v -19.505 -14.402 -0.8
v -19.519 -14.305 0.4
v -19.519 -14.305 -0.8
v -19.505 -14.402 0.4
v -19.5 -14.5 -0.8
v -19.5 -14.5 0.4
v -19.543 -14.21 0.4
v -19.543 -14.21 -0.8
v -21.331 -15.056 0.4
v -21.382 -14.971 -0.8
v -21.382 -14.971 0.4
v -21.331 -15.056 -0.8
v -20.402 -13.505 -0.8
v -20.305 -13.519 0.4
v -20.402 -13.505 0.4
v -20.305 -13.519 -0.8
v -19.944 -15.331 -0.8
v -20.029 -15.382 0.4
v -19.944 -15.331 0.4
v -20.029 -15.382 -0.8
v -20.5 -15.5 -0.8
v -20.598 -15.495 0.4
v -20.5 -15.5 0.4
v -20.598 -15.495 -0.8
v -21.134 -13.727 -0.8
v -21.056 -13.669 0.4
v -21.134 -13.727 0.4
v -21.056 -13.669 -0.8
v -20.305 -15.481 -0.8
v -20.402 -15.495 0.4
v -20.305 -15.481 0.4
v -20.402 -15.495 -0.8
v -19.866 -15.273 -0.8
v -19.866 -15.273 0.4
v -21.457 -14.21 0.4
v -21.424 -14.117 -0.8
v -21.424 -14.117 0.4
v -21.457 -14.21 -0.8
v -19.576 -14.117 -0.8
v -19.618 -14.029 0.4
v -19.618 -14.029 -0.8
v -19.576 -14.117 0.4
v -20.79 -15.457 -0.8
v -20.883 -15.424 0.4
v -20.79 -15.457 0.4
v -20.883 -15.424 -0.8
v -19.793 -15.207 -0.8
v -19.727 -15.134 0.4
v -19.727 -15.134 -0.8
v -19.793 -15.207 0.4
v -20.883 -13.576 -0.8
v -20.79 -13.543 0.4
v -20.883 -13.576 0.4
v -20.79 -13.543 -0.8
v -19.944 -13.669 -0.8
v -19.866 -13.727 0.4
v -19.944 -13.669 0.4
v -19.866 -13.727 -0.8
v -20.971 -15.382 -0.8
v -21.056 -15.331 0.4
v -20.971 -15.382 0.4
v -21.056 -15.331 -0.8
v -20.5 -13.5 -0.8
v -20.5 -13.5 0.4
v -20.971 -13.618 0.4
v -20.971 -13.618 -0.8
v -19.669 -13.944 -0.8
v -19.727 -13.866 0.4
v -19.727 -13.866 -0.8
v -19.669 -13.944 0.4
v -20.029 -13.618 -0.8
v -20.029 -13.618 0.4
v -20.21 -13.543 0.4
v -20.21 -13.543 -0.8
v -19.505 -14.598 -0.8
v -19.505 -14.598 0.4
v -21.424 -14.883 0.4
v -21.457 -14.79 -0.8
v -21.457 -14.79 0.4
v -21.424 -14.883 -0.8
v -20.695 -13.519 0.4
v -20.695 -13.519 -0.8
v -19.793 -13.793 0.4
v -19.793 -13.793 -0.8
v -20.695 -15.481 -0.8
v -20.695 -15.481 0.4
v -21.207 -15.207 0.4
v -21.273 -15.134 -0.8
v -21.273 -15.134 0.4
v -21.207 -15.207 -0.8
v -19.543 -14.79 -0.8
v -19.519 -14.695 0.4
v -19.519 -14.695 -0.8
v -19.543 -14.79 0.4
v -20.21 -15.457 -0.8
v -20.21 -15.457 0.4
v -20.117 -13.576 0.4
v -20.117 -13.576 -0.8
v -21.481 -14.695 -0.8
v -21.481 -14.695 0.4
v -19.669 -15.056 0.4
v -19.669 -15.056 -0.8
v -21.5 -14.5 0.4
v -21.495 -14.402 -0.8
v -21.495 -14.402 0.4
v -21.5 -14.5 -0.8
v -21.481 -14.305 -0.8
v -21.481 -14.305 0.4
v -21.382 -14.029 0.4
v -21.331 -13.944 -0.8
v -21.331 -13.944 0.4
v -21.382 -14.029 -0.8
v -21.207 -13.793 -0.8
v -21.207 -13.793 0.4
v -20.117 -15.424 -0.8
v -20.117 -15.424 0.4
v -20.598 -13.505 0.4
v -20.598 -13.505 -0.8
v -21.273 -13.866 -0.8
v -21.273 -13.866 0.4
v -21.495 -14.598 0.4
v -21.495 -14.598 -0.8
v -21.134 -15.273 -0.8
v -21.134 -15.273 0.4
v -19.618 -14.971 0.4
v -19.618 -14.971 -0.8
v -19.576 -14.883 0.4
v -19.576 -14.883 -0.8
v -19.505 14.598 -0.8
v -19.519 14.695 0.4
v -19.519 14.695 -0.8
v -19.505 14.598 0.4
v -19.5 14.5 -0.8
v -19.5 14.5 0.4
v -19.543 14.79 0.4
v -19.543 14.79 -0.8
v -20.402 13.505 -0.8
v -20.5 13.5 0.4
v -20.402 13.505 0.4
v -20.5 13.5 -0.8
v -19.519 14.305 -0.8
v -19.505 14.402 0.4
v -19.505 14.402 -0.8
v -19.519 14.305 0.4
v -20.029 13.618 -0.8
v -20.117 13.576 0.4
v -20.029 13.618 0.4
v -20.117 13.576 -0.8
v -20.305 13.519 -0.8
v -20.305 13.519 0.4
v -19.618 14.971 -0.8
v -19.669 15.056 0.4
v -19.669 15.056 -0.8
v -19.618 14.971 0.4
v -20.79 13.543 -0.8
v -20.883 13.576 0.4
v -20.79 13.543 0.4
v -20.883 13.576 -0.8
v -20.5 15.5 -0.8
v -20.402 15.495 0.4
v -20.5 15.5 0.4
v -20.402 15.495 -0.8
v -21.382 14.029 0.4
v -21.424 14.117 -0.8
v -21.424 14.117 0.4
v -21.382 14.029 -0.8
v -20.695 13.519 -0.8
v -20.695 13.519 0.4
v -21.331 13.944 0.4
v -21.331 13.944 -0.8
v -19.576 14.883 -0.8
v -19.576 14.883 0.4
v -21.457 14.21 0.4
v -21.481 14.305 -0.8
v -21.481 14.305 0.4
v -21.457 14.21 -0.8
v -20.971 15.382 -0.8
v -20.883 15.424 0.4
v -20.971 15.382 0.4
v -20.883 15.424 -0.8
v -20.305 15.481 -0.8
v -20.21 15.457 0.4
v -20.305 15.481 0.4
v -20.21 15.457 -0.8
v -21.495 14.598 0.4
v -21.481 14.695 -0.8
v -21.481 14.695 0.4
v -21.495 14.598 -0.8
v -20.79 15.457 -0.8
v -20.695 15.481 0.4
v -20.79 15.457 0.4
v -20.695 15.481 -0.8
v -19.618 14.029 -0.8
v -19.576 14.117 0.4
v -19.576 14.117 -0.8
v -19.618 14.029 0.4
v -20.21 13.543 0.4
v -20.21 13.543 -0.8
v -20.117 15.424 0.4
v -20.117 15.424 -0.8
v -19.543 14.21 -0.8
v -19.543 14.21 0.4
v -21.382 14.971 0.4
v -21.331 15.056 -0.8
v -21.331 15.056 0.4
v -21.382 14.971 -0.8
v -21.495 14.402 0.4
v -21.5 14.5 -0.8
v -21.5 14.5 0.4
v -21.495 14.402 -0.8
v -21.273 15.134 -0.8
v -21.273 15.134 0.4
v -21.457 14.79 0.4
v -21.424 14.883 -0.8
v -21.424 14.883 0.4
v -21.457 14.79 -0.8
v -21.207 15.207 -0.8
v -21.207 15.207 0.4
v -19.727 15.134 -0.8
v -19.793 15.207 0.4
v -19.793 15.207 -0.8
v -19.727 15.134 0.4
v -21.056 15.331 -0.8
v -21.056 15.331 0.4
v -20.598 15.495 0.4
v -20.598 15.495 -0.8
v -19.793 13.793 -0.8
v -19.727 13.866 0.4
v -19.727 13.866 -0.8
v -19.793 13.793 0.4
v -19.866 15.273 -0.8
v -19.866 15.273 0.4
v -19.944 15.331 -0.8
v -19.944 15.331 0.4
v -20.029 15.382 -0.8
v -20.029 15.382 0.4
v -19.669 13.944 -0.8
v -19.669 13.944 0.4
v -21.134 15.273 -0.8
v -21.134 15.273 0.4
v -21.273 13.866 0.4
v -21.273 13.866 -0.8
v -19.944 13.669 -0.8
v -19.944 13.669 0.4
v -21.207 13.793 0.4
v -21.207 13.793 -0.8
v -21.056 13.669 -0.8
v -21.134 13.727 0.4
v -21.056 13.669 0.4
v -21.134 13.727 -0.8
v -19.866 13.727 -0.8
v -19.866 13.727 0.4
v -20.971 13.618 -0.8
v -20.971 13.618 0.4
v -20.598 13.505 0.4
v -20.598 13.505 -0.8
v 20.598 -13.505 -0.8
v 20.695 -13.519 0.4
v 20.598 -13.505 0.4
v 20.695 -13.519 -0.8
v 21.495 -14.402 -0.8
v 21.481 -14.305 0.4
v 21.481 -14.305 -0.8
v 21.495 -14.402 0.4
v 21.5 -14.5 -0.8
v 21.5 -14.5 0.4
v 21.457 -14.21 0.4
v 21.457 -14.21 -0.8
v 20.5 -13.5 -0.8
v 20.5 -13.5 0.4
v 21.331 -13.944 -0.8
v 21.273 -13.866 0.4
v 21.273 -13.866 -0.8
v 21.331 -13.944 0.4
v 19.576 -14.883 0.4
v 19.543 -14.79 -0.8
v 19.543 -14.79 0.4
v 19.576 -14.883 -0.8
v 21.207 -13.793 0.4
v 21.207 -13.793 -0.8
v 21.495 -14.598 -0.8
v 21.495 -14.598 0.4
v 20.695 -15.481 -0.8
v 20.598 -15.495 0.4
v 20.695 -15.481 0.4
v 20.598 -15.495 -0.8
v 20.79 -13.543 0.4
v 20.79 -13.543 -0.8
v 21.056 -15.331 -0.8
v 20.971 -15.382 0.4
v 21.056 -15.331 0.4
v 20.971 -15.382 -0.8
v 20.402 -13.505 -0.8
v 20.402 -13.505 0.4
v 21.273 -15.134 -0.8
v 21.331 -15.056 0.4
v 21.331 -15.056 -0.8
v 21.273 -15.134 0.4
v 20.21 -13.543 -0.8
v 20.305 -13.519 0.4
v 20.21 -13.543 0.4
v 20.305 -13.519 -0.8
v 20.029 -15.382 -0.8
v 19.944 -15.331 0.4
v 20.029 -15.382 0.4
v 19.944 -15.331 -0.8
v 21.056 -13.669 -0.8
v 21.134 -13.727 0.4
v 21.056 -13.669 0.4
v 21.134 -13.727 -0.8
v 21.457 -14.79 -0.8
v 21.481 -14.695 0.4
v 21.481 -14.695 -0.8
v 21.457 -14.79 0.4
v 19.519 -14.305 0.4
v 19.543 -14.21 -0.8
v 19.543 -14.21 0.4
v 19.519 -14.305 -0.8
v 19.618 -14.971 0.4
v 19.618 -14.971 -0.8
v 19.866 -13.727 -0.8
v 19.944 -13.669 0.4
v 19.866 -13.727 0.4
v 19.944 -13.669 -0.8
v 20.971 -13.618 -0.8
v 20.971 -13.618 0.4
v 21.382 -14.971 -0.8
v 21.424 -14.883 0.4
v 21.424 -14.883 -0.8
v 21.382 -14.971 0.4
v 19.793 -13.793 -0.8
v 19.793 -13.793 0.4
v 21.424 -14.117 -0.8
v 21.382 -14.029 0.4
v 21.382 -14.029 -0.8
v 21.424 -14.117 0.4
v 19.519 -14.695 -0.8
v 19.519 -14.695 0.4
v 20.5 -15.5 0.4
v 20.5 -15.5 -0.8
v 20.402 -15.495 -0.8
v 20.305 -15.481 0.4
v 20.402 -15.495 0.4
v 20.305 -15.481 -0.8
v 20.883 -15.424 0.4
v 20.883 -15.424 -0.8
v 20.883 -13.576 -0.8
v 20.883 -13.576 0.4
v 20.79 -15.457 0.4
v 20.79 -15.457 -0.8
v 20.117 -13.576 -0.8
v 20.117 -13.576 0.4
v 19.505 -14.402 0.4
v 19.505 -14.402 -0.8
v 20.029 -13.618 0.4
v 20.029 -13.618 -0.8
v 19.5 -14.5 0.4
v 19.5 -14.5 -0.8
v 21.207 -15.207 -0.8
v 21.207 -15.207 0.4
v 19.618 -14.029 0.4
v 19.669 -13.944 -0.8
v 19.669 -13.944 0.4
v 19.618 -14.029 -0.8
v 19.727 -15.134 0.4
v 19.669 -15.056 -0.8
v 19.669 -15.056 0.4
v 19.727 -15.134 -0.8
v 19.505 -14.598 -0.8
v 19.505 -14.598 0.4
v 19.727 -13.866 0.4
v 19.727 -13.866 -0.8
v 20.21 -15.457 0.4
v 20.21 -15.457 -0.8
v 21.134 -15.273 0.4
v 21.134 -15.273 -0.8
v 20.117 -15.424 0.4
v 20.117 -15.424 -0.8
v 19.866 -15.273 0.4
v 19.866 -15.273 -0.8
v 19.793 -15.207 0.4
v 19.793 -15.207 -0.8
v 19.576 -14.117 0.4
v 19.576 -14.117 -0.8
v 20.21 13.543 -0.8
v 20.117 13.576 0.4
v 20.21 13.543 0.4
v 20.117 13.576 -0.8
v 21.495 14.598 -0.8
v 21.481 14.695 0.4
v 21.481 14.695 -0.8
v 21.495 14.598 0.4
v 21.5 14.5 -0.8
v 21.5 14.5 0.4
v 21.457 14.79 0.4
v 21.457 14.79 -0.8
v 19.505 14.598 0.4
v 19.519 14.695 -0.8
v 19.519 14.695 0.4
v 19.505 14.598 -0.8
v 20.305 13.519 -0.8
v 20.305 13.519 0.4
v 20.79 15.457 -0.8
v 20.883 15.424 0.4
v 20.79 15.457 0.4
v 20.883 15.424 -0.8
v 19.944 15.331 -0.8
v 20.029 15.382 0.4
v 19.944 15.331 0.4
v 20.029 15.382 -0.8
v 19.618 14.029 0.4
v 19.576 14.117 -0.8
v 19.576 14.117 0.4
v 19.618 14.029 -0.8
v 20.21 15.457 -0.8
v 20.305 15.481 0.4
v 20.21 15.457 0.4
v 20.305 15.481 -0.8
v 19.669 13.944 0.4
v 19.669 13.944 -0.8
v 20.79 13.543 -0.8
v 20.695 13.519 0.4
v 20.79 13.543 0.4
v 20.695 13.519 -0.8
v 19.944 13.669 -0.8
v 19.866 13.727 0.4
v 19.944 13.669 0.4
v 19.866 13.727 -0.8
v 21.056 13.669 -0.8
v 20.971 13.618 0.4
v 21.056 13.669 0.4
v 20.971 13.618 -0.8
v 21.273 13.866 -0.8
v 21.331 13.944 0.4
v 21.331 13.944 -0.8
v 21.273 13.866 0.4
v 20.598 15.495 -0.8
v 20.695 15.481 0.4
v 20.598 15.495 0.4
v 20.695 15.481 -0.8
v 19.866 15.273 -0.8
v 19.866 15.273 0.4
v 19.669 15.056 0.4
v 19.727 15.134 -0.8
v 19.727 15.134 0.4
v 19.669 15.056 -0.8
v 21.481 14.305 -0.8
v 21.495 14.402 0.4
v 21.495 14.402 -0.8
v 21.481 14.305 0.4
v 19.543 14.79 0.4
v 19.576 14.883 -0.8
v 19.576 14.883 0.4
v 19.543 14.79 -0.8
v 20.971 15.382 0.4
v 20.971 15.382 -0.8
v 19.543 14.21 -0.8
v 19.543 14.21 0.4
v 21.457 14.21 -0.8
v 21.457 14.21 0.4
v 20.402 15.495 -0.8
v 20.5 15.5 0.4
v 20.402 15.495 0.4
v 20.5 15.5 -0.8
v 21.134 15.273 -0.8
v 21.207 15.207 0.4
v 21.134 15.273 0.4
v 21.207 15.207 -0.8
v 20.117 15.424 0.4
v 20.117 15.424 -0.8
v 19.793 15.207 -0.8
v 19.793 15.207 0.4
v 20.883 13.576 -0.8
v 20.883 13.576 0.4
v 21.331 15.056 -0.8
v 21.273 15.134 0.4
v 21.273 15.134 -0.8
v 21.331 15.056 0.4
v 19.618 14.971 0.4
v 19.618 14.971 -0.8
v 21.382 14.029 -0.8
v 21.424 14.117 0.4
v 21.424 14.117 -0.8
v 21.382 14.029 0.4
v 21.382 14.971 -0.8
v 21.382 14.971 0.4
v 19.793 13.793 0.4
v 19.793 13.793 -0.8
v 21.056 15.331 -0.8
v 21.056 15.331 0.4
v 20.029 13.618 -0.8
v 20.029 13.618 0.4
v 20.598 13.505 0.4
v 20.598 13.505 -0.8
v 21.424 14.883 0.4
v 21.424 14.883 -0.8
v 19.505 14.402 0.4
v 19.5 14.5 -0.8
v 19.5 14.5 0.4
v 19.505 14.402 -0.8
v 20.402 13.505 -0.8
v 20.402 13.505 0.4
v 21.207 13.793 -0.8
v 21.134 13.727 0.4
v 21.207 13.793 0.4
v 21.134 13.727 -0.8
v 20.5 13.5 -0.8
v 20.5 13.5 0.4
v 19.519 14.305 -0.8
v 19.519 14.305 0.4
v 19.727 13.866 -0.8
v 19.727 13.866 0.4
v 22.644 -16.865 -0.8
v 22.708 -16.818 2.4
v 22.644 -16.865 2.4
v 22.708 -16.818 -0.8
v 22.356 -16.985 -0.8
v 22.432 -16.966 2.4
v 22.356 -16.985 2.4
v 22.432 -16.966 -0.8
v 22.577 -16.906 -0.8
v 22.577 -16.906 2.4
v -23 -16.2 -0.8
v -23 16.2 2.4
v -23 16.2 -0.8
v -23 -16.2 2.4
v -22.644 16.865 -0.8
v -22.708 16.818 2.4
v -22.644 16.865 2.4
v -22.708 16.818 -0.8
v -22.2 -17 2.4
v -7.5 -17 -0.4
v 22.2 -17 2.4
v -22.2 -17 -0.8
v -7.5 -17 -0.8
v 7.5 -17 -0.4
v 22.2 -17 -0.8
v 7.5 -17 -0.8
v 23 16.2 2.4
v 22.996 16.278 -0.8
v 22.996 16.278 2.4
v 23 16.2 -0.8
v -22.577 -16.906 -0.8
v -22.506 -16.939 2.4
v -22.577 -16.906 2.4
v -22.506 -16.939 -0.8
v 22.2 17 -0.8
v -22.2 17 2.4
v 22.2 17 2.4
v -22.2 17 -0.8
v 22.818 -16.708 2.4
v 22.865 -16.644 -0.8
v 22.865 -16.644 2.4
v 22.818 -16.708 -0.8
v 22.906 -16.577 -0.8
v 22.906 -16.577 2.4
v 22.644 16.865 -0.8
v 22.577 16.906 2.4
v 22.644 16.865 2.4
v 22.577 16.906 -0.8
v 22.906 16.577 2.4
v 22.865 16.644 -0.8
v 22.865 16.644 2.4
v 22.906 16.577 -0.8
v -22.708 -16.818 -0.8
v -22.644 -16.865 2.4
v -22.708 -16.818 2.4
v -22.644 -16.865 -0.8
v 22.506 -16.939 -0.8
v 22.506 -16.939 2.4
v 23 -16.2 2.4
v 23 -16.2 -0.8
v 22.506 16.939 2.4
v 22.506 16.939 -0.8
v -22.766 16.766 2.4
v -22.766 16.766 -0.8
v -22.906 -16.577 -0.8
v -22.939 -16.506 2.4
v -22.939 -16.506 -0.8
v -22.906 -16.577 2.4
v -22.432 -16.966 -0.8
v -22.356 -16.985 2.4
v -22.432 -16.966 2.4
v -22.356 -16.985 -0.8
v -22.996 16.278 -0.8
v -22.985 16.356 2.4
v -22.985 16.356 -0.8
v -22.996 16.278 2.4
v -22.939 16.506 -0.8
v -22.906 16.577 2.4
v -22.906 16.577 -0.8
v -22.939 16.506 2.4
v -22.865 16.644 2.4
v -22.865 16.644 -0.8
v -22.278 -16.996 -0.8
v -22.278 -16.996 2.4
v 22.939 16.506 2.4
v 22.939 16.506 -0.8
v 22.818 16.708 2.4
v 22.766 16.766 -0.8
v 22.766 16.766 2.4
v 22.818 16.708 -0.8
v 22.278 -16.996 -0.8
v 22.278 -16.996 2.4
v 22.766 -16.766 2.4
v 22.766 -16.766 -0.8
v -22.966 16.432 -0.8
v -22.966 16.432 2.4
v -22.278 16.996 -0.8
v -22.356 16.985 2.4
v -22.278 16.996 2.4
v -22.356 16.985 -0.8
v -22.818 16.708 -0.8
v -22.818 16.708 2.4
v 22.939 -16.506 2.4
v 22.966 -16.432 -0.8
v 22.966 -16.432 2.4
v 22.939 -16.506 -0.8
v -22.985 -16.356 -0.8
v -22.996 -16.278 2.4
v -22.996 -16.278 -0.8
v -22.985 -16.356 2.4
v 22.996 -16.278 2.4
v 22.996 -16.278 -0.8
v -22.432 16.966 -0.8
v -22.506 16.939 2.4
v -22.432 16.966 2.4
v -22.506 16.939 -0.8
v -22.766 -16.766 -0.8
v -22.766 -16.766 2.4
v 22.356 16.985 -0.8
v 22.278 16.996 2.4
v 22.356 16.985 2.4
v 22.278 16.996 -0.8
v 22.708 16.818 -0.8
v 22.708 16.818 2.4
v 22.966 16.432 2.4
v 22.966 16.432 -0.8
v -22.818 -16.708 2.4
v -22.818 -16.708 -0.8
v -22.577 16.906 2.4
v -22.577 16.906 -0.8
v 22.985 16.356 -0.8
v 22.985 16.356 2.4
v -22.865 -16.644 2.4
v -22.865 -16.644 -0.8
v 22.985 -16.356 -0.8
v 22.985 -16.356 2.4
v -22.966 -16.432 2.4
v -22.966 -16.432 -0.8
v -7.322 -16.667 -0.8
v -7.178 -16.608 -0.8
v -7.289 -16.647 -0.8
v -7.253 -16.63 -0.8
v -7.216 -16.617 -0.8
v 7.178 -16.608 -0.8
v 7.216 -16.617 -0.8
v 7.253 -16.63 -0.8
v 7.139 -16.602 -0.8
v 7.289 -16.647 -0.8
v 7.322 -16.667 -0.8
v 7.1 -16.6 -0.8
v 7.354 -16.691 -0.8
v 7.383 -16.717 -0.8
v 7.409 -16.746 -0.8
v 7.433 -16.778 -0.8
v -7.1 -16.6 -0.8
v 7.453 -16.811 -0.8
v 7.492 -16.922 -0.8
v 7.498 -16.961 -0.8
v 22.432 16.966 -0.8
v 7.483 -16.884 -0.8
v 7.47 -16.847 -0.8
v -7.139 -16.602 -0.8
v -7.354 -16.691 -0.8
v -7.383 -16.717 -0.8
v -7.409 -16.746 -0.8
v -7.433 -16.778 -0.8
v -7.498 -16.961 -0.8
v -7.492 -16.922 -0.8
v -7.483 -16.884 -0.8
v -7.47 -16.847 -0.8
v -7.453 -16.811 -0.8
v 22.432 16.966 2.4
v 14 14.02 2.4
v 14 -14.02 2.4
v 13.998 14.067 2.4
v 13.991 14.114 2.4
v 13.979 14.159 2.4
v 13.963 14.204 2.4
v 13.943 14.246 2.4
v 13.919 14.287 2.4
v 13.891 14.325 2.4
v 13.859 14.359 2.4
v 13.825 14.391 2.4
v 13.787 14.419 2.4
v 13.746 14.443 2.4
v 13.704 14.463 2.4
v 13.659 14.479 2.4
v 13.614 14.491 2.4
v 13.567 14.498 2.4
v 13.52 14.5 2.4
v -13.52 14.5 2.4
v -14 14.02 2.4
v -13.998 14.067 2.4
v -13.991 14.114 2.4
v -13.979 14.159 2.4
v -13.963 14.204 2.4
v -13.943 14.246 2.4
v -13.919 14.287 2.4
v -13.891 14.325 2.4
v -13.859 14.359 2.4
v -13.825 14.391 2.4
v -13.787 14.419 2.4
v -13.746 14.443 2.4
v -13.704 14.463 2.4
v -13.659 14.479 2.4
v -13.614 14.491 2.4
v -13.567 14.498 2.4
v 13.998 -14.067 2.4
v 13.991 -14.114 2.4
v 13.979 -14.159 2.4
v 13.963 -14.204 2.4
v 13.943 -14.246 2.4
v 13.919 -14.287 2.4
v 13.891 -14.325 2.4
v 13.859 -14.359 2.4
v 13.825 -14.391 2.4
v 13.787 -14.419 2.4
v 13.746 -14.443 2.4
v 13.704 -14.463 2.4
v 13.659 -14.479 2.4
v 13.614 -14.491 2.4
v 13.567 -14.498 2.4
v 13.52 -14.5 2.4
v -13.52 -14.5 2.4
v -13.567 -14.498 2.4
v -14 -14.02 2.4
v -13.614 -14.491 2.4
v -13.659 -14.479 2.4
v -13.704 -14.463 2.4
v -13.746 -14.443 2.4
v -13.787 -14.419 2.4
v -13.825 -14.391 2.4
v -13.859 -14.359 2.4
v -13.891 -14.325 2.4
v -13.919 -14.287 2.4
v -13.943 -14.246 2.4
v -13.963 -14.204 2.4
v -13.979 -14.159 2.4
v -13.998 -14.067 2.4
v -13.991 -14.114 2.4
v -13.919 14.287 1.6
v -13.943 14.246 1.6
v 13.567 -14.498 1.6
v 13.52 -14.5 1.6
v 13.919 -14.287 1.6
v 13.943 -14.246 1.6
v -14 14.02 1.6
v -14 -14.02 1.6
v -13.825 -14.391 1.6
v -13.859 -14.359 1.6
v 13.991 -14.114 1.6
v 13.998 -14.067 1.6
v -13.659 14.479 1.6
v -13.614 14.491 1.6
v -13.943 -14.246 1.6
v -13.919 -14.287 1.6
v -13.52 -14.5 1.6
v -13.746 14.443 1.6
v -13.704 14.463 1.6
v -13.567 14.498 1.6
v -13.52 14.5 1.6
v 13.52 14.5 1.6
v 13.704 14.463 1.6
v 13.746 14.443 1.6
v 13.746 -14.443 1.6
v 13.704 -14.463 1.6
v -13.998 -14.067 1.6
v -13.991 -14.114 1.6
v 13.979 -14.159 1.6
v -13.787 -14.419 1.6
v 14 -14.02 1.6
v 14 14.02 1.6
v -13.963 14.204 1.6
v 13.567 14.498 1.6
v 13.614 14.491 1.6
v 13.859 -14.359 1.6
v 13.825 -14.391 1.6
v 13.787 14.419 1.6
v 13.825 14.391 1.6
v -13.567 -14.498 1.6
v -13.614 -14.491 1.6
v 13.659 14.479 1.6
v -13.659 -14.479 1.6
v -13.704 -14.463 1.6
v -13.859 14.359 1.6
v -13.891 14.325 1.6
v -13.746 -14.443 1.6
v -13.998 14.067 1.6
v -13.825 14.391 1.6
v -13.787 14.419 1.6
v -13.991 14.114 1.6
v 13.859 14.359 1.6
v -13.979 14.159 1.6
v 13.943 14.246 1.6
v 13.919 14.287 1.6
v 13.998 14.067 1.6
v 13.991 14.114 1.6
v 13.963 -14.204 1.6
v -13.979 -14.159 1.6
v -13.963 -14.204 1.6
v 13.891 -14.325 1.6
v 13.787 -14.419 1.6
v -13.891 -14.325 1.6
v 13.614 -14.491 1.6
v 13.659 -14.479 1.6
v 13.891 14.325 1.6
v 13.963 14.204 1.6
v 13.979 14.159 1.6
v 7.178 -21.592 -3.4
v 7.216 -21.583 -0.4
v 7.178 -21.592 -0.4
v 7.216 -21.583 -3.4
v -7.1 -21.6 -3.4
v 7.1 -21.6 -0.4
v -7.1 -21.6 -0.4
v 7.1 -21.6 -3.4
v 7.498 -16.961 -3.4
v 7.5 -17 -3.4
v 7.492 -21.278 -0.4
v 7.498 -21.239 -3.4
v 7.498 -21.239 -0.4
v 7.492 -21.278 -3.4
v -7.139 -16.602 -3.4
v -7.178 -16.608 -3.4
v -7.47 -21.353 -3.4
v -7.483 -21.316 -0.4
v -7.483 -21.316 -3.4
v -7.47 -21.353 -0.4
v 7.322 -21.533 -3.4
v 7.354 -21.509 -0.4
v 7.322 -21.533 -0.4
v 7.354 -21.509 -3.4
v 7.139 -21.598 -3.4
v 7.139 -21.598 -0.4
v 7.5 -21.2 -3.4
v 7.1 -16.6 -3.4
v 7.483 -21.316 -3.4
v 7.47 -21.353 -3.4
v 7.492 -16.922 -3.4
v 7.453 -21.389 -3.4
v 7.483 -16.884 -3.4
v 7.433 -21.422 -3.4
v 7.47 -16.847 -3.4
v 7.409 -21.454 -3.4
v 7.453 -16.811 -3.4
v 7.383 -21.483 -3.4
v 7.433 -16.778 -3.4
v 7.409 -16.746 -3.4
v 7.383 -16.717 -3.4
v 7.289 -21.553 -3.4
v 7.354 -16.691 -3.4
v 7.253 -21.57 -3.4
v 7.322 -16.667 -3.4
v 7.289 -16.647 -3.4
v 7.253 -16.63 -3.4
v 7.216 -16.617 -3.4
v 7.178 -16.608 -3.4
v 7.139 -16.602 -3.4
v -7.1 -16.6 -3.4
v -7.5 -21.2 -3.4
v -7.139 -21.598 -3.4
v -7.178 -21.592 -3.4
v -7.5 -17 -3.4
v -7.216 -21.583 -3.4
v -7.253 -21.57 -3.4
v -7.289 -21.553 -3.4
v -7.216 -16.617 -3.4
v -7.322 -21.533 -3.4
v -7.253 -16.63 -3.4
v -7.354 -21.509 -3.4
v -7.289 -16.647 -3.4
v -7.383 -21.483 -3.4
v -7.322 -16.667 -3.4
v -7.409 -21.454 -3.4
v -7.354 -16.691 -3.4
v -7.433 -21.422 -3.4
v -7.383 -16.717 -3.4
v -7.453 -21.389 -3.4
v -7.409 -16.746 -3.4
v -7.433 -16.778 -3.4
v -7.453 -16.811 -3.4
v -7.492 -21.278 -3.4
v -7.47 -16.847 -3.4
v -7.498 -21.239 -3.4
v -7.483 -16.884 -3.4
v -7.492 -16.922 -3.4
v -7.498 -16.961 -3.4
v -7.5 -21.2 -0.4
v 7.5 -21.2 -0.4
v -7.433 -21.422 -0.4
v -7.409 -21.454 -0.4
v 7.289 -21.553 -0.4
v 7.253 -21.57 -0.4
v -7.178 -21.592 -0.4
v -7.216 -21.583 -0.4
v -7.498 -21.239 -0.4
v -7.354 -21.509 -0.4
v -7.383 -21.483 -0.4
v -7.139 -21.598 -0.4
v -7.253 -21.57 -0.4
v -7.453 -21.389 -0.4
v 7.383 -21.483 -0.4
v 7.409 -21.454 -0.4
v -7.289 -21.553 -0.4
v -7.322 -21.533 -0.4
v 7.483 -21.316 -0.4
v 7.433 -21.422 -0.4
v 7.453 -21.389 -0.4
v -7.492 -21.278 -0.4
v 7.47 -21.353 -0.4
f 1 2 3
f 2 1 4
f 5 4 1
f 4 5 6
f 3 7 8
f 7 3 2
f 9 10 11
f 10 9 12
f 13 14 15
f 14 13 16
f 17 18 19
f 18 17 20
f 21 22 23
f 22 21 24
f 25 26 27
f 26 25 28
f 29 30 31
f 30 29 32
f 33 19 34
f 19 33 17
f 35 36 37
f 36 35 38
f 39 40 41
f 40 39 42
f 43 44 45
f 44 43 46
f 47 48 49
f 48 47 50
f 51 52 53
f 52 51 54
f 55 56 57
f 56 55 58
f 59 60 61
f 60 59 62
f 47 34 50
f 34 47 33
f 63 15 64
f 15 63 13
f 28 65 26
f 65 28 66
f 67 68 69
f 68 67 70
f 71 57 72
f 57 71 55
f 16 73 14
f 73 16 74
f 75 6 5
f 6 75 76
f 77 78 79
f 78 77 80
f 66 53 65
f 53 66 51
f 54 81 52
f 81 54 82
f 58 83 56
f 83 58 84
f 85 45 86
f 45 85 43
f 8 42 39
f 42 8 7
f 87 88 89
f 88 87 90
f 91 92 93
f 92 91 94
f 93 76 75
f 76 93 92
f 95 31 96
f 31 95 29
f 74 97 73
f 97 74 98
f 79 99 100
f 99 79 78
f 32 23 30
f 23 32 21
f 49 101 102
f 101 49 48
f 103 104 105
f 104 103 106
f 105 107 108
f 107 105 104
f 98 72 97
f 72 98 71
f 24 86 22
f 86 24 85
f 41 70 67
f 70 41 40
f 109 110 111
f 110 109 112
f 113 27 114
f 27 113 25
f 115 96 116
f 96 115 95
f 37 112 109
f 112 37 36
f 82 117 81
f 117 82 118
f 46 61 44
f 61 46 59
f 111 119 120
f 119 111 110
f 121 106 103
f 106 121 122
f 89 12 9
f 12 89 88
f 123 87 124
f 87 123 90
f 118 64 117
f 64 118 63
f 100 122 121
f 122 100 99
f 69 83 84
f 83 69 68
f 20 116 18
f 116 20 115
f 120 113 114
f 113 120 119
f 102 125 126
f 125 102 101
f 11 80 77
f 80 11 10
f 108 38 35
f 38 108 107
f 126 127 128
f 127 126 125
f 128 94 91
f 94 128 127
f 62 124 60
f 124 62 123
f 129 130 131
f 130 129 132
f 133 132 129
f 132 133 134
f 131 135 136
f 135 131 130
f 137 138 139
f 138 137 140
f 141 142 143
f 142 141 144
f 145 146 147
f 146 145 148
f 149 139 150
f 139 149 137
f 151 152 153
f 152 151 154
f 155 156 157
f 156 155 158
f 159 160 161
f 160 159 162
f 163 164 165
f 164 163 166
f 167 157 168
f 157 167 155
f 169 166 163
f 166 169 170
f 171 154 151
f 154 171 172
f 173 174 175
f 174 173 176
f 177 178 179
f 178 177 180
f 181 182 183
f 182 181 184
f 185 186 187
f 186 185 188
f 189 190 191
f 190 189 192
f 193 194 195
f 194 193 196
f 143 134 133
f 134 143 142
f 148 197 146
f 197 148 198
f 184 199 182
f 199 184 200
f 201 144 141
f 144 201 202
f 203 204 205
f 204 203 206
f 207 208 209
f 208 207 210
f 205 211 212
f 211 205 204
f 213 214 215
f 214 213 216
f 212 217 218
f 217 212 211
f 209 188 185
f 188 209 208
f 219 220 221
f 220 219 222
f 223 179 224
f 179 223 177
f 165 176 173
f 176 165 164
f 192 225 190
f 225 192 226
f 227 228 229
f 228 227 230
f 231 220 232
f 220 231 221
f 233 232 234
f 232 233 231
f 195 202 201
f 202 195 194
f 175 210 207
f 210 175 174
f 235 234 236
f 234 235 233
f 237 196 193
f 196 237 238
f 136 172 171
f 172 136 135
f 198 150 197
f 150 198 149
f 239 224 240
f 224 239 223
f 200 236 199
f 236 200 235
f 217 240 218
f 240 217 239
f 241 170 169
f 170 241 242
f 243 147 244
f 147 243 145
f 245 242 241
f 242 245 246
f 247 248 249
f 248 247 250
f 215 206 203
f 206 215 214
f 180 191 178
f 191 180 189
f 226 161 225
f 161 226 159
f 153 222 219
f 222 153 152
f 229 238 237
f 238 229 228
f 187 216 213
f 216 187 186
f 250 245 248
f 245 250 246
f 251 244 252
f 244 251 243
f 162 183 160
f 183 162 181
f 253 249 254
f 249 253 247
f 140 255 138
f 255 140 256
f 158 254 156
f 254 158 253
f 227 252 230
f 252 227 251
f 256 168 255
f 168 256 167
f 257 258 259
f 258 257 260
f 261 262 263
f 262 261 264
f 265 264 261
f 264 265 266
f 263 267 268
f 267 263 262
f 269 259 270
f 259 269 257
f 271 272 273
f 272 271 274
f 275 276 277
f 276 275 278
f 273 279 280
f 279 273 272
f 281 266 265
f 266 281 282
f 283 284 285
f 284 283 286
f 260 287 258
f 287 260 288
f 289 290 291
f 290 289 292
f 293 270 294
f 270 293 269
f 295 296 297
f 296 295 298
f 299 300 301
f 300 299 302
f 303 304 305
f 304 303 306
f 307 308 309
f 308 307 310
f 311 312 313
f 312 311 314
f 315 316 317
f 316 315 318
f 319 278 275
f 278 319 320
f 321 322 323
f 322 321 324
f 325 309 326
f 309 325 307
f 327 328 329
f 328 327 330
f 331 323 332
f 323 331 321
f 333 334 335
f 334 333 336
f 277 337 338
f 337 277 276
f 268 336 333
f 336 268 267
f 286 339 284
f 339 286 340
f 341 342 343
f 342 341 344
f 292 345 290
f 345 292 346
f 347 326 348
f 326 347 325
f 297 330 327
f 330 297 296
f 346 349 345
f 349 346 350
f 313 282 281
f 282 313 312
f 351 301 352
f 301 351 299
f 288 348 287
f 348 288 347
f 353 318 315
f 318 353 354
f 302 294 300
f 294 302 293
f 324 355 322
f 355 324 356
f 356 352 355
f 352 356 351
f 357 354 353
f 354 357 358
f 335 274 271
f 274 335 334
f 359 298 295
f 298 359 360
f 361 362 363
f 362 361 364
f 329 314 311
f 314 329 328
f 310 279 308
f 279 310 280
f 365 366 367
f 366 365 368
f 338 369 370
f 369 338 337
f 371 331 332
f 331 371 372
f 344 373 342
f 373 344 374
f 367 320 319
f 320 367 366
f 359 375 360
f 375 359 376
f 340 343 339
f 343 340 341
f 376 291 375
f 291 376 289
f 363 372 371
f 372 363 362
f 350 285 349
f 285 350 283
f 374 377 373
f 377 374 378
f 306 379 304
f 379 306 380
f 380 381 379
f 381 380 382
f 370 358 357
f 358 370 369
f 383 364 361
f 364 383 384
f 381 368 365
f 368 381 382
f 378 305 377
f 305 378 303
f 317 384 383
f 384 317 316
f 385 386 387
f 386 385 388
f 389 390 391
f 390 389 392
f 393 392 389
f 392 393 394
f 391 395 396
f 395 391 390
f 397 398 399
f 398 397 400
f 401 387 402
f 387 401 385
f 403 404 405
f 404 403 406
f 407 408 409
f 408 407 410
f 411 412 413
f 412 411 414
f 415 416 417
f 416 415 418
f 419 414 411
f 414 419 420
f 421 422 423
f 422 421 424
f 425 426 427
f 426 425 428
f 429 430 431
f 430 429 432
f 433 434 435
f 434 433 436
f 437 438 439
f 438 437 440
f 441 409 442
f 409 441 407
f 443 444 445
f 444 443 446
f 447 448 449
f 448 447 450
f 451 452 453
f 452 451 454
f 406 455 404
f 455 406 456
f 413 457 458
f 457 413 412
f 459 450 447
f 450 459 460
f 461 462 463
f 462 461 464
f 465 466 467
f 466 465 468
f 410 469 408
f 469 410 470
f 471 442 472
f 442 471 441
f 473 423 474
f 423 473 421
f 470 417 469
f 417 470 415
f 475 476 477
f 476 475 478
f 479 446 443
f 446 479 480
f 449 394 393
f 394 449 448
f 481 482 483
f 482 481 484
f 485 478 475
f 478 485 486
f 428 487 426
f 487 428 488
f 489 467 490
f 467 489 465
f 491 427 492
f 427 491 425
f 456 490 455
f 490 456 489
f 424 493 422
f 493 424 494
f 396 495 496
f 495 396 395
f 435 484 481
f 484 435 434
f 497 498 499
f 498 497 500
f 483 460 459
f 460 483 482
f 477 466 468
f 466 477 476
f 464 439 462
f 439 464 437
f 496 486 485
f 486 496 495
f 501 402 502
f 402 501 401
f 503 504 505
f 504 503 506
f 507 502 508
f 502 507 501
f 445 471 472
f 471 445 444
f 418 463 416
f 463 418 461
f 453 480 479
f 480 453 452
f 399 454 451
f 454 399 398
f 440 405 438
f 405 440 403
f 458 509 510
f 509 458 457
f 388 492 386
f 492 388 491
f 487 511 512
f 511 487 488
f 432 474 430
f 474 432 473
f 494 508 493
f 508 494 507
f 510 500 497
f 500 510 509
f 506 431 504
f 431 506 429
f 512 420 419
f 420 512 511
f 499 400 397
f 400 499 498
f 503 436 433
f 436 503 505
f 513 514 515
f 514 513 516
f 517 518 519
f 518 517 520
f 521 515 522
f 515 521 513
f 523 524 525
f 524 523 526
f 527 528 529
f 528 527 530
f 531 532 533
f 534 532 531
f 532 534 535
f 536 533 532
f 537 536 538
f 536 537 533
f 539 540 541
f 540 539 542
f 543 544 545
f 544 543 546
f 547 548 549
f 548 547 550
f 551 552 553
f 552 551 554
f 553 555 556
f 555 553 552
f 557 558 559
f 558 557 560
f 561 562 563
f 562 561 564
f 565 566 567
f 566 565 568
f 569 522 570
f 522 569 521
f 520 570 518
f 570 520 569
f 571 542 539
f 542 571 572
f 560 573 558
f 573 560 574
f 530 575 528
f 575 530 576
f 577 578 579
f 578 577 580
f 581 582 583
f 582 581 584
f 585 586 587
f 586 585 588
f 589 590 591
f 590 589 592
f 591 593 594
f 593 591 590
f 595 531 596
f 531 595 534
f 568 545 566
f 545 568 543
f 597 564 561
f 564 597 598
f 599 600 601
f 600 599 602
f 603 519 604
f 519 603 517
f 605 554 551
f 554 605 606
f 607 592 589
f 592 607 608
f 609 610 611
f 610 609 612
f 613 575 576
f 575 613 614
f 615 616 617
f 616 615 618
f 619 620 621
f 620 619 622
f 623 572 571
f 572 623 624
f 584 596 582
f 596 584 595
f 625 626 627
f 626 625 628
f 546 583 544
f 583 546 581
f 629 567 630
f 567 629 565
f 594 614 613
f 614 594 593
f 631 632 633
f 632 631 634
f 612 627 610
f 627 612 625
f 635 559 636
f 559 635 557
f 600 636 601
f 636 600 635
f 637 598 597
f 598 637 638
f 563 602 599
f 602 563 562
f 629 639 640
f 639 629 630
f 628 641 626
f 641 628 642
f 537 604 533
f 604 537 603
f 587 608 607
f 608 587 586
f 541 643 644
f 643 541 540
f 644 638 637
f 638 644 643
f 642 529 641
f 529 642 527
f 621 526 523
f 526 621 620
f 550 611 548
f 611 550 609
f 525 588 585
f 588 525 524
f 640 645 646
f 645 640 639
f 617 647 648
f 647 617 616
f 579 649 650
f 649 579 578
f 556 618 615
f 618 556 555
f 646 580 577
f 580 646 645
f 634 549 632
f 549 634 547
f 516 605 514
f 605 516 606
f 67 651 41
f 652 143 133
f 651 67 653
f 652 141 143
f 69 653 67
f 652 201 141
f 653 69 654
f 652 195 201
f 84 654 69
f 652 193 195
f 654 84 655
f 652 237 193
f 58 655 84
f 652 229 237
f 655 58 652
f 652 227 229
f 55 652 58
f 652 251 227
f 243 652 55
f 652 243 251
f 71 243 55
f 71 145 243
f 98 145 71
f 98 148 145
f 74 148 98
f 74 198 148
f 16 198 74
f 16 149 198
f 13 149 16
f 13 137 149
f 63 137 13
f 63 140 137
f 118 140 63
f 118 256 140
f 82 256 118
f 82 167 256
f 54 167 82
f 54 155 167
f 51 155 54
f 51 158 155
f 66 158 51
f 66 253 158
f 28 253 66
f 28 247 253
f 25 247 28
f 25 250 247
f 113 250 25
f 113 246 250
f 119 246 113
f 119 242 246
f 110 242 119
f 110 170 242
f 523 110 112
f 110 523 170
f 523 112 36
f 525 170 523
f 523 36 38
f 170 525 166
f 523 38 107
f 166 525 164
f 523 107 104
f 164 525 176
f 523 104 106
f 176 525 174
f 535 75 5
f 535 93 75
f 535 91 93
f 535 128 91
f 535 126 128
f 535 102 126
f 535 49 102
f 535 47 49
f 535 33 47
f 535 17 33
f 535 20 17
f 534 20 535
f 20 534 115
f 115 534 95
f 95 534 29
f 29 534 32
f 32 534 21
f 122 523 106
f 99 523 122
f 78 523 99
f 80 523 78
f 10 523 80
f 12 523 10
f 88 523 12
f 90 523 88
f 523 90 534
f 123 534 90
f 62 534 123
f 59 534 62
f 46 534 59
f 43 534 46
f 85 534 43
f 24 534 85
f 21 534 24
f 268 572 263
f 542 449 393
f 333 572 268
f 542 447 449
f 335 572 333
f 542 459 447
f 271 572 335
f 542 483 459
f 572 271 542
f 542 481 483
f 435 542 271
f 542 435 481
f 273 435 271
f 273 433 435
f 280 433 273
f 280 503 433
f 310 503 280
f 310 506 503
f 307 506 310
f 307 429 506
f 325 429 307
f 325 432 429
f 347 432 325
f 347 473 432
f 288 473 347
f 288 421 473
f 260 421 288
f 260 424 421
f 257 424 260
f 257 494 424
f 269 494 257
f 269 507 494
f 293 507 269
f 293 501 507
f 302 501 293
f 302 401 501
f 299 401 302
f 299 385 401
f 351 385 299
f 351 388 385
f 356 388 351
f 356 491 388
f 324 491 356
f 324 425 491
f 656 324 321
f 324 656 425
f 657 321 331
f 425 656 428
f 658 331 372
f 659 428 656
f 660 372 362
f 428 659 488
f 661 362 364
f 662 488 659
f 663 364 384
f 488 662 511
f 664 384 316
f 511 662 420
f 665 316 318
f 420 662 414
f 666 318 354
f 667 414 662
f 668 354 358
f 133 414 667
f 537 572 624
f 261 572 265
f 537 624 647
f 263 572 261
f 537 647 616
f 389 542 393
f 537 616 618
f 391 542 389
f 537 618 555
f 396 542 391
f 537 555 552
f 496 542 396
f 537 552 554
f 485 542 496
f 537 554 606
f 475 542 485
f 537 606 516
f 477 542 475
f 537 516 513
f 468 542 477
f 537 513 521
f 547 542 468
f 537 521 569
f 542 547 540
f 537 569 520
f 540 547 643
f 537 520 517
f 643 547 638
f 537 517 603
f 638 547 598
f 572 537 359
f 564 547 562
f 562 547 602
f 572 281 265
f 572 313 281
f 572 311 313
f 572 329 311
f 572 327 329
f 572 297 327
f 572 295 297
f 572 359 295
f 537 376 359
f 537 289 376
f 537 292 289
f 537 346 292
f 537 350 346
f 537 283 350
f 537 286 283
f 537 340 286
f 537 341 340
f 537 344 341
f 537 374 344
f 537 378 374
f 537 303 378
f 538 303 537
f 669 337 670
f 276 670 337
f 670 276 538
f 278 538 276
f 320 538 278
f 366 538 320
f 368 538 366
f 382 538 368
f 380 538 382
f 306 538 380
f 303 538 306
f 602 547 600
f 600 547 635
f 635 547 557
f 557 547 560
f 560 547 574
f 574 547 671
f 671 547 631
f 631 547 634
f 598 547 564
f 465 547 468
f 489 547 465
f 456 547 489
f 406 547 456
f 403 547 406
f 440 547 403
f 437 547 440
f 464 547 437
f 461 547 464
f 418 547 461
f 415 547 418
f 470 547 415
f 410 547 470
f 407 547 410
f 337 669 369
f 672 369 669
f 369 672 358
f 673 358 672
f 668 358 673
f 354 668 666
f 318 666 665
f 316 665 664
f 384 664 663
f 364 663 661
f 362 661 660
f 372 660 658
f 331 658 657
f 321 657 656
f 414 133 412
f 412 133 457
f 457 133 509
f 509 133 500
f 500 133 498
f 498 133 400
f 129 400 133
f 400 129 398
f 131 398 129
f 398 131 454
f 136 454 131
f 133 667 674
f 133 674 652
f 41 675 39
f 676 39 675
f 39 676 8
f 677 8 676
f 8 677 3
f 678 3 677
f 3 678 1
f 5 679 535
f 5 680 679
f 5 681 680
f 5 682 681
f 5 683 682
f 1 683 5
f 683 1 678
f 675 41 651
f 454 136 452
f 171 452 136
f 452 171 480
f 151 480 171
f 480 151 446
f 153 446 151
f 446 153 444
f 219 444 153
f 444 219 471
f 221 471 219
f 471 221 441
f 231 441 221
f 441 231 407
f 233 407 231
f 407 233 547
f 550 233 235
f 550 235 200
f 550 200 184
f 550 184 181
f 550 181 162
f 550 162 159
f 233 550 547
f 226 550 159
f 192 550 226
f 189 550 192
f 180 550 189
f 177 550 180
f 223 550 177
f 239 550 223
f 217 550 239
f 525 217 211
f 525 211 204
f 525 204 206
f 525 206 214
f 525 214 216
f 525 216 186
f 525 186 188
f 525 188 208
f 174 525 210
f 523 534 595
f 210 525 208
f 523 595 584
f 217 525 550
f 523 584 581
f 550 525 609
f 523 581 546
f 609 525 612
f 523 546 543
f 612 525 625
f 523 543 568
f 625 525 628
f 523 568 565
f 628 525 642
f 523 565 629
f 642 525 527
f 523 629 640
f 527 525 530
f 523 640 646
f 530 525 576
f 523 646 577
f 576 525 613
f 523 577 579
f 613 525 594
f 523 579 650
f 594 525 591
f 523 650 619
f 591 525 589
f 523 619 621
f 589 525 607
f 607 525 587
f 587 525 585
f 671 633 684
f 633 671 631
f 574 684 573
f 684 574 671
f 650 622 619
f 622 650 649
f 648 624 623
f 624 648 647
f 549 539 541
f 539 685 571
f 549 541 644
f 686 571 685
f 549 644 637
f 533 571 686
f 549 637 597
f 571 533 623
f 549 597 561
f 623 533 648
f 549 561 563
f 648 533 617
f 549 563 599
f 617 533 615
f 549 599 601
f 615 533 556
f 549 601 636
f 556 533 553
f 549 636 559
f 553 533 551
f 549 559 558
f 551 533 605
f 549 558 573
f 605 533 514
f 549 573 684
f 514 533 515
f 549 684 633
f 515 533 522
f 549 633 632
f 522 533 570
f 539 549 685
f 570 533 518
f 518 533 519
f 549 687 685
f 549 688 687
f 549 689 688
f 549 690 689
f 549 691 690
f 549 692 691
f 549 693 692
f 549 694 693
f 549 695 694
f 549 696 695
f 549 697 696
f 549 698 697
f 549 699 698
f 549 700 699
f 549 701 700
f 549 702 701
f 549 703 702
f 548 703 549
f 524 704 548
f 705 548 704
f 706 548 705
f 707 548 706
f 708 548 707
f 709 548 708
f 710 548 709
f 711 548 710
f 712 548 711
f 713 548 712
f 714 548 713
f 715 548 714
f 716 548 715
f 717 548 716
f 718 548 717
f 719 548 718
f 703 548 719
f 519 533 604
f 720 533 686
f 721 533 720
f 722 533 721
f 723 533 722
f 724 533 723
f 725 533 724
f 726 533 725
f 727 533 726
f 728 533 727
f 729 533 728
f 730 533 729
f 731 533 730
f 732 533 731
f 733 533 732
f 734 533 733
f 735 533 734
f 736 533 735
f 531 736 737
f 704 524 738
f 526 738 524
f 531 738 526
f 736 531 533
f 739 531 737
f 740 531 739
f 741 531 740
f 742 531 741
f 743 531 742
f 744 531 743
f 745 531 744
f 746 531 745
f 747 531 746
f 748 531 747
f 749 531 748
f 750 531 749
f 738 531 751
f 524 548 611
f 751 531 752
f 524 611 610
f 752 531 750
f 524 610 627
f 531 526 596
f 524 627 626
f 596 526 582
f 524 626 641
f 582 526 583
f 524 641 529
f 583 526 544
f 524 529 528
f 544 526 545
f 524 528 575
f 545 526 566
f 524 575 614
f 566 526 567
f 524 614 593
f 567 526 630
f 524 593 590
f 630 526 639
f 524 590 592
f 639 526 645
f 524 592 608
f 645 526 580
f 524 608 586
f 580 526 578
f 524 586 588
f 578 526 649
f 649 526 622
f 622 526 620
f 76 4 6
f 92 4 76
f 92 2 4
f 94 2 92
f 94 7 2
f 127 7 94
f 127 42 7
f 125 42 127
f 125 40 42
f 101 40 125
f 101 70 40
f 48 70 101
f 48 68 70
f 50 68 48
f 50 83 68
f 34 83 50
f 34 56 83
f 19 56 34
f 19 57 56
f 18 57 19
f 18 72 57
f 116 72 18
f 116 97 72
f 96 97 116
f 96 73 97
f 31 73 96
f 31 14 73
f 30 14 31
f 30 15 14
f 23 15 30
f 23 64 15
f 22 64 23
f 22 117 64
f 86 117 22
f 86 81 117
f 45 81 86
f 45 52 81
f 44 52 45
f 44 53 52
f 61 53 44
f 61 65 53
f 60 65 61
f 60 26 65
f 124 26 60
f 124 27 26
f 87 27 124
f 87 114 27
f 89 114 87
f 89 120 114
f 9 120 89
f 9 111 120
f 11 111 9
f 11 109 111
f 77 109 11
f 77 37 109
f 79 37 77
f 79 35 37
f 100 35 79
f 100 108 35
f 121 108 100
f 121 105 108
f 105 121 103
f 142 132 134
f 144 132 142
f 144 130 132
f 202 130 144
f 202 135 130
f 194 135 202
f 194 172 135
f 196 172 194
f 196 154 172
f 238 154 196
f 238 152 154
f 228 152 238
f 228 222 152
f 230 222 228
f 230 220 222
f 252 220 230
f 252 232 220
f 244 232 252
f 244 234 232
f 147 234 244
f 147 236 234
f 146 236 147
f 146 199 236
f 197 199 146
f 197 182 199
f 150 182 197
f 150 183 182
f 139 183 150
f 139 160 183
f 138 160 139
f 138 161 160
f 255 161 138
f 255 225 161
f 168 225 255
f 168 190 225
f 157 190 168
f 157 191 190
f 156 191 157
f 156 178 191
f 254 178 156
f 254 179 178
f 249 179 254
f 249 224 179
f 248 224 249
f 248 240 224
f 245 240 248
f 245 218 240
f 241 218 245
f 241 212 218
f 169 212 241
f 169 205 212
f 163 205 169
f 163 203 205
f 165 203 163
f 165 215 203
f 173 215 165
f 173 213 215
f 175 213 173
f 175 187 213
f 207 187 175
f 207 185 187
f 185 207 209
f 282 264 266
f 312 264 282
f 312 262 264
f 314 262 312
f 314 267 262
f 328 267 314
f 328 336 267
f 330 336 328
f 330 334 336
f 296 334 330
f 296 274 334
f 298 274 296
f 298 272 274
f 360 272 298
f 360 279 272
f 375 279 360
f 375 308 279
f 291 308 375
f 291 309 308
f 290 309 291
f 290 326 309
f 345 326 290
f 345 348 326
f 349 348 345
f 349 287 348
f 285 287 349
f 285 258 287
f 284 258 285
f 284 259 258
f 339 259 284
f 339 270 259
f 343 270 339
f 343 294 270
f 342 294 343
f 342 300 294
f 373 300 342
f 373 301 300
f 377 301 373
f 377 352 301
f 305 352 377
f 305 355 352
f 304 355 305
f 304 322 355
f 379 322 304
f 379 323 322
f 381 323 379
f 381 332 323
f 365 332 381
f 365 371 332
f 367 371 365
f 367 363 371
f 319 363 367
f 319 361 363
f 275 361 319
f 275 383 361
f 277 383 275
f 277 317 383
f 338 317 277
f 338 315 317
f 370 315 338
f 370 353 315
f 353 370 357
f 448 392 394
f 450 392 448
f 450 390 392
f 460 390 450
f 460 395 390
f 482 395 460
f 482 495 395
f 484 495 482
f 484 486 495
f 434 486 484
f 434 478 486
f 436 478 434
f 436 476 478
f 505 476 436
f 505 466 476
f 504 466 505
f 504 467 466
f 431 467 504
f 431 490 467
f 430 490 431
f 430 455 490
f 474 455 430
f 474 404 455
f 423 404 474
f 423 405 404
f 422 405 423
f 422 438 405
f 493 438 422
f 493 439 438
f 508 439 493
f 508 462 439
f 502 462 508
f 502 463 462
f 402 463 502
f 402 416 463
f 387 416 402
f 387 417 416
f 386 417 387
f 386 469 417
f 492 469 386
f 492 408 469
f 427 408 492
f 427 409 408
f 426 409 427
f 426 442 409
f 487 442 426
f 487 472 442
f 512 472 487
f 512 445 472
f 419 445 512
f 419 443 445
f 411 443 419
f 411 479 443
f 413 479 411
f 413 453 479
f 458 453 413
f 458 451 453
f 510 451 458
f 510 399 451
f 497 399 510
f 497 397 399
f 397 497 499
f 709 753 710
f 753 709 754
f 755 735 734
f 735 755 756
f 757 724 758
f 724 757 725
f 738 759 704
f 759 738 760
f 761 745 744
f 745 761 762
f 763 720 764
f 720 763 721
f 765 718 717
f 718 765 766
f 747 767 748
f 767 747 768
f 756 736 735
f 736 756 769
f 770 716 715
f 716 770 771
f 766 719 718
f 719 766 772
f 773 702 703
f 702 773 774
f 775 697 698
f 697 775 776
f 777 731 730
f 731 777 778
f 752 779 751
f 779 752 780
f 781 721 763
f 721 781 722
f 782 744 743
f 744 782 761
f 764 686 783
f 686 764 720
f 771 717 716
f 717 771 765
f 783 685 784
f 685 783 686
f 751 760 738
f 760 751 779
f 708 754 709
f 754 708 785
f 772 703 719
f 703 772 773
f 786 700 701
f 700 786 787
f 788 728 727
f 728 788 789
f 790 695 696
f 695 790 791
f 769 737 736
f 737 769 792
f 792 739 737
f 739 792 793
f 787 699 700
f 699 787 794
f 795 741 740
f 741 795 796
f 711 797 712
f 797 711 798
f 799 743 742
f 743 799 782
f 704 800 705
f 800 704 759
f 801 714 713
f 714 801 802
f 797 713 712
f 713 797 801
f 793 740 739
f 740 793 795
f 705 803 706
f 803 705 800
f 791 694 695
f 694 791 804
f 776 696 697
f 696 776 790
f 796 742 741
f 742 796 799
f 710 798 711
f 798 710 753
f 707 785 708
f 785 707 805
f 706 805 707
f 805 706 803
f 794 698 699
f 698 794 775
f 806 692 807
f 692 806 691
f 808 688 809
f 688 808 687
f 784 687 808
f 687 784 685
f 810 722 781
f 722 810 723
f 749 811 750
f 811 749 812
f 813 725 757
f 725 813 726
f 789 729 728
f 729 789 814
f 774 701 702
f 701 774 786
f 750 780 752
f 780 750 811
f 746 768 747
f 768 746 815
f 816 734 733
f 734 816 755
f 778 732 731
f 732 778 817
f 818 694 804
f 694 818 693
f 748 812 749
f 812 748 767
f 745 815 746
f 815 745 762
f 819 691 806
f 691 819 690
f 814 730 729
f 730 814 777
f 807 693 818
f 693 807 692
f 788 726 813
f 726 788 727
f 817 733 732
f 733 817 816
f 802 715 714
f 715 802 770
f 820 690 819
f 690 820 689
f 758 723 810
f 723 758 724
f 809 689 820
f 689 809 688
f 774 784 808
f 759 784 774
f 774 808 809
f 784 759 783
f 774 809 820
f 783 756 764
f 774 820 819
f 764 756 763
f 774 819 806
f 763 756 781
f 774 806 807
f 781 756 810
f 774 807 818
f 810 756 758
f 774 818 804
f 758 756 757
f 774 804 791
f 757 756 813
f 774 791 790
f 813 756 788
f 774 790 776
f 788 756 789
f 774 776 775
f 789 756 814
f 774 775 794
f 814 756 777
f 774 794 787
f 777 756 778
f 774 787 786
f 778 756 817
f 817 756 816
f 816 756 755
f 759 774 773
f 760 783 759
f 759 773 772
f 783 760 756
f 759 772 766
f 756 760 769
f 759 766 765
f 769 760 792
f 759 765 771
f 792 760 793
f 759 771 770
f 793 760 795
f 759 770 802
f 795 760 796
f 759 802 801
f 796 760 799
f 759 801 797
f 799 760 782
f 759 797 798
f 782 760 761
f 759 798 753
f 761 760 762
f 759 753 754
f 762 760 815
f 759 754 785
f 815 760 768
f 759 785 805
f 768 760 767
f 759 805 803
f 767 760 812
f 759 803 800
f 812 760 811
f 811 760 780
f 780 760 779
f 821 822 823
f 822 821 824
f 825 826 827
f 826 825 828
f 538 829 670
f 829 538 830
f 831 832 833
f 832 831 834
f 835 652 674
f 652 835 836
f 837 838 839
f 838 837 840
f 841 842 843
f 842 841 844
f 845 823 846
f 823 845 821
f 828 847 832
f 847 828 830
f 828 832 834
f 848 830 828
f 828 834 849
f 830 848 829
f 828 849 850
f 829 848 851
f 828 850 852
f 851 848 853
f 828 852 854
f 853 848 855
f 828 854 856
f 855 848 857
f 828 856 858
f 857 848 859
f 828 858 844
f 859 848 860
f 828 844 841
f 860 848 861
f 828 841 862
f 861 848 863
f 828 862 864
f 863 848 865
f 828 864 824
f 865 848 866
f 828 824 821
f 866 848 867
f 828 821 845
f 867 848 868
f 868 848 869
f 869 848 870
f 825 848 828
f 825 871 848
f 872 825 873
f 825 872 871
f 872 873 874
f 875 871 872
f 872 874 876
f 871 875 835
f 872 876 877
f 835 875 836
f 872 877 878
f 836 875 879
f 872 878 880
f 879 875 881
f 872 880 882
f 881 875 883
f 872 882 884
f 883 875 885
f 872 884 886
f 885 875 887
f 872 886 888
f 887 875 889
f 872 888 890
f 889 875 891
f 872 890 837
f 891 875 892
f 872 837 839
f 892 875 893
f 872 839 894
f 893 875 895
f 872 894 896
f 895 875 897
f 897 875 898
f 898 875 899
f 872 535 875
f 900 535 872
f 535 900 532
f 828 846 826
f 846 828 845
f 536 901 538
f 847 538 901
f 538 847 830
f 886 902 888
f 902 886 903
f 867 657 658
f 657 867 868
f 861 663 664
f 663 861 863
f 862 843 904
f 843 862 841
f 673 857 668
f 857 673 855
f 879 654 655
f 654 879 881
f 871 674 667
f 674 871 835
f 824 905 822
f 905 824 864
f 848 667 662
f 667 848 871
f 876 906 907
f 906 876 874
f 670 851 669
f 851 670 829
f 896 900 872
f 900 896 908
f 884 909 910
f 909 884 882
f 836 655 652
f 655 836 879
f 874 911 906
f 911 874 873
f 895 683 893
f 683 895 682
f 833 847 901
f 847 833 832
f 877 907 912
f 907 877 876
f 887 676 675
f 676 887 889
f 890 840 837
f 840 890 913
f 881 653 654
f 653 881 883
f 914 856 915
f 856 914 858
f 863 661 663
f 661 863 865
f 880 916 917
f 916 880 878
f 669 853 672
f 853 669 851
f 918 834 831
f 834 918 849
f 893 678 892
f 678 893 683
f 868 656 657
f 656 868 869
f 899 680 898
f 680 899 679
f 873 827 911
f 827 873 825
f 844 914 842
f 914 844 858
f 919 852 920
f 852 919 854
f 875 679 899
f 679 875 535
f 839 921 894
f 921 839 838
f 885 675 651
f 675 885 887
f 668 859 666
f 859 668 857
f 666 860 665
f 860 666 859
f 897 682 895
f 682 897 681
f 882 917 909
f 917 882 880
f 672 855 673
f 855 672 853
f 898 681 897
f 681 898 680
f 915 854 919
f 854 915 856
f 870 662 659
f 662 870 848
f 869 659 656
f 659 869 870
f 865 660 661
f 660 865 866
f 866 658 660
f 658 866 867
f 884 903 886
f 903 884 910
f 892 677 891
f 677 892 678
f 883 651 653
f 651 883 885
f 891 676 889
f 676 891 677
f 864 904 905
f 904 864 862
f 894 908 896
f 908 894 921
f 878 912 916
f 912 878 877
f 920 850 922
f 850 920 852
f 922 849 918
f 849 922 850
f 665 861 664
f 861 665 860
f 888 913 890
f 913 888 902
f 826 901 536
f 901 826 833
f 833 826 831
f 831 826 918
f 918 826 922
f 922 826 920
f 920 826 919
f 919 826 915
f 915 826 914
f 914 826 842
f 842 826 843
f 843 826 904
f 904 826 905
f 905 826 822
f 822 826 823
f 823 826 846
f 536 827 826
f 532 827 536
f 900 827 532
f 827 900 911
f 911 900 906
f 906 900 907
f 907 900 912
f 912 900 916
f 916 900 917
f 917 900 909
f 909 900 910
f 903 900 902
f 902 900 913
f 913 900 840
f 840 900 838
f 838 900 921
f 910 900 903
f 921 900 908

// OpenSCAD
$fn = 64;

// Parameters (mm)
overall_width_mm = 46.0;          //[23:92:0.5]
overall_height_mm = 34.0;         //[17:68:0.5]
pcb_thickness_mm = 1.6;           //[0.8:3.2:0.1]

bezel_thickness_mm = 2.0;         //[1:4:0.1]
aperture_depth_mm = 1.2;          //[0.5:3:0.1]
display_glass_thickness_mm = 0.8; //[0.4:2:0.1]

active_area_width_mm = 28.0;      //[14:56:0.5]
active_area_height_mm = 35.0;     //[17.5:70:0.5]  // will be clamped to fit

corner_radius_mm = 0.8;           //[0:2:0.1]

mount_hole_diameter_mm = 2.0;     //[1:4:0.1]
mount_hole_edge_offset_mm = 2.5;  //[1.25:5:0.1]
mount_pad_diameter_mm = 4.0;      //[2:8:0.1]
mount_pad_height_mm = 0.6;        //[0.3:1.5:0.1]

connector_width_mm = 15.0;        //[7.5:30:0.5]
connector_depth_mm = 5.0;         //[2.5:10:0.5]
connector_height_mm = 3.0;        //[1.5:6:0.1]

overlap_mm = 0.4;                 //[0.1:2:0.1]

// Helpers
function clamp(v, lo, hi) = v < lo ? lo : (v > hi ? hi : v);

module rrect2d(w, h, r) {
  r2 = clamp(r, 0, min(w, h)/2);
  if (r2 <= 0)
    square([w, h], center=true);
  else
    offset(r=r2) offset(delta=-r2) square([w, h], center=true);
}

module rrect3d(w, h, t, r) {
  linear_extrude(height=t, center=true)
    rrect2d(w, h, r);
}

// Main model: ONE connected solid
module lcd_tft_128x160_module() {

  // Clamp active area to fit within bezel footprint
  aa_w = clamp(active_area_width_mm, 1, overall_width_mm - 2*mount_hole_edge_offset_mm);
  aa_h = clamp(active_area_height_mm, 1, overall_height_mm - 2*mount_hole_edge_offset_mm);

  // Z stacking (centered around Z=0 for PCB)
  pcb_zc   = 0;
  pcb_top  = pcb_zc + pcb_thickness_mm/2;
  pcb_bot  = pcb_zc - pcb_thickness_mm/2;

  bezel_zc = pcb_top + bezel_thickness_mm/2 - overlap_mm; // overlap into PCB
  bezel_top = bezel_zc + bezel_thickness_mm/2;

  // Glass sits in the aperture (slightly overlapping for watertight union)
  glass_zc = (bezel_top - aperture_depth_mm) + display_glass_thickness_mm/2 - overlap_mm;

  // Connector on back side, attached to PCB bottom
  conn_zc = pcb_bot - connector_height_mm/2 + overlap_mm;

  // Mounting hole positions
  hx = overall_width_mm/2  - mount_hole_edge_offset_mm;
  hy = overall_height_mm/2 - mount_hole_edge_offset_mm;

  union() {

    // PCB with mounting holes (holes are cut through PCB only)
    difference() {
      translate([0,0,pcb_zc])
        rrect3d(overall_width_mm, overall_height_mm, pcb_thickness_mm, corner_radius_mm);

      for (x = [-1, 1])
        for (y = [-1, 1])
          translate([x*hx, y*hy, pcb_zc])
            cylinder(h=pcb_thickness_mm + 2*overlap_mm, r=mount_hole_diameter_mm/2, center=true);
    }

    // Mount pads (rings) around holes on top side, connected to PCB
    for (x = [-1, 1])
      for (y = [-1, 1])
        translate([x*hx, y*hy, pcb_top + mount_pad_height_mm/2 - overlap_mm])
          difference() {
            cylinder(h=mount_pad_height_mm, r=mount_pad_diameter_mm/2, center=true);
            cylinder(h=mount_pad_height_mm + 2*overlap_mm, r=mount_hole_diameter_mm/2, center=true);
          }

    // Bezel/frame with screen window cutout
    difference() {
      translate([0,0,bezel_zc])
        rrect3d(overall_width_mm, overall_height_mm, bezel_thickness_mm, corner_radius_mm);

      // Aperture cut (window) from top face down by aperture_depth
      translate([0,0,bezel_top - aperture_depth_mm/2 + overlap_mm])
        rrect3d(aa_w, aa_h, aperture_depth_mm + 2*overlap_mm, max(0, corner_radius_mm*0.6));
    }

    // Display glass inside the aperture
    translate([0,0,glass_zc])
      rrect3d(aa_w, aa_h, display_glass_thickness_mm, max(0, corner_radius_mm*0.4));

    // Back connector block (centered on bottom edge), attached to PCB underside
    translate([0, -(overall_height_mm/2 + connector_depth_mm/2 - overlap_mm), conn_zc])
      rrect3d(connector_width_mm, connector_depth_mm, connector_height_mm, 0.4);
  }
}

lcd_tft_128x160_module();
